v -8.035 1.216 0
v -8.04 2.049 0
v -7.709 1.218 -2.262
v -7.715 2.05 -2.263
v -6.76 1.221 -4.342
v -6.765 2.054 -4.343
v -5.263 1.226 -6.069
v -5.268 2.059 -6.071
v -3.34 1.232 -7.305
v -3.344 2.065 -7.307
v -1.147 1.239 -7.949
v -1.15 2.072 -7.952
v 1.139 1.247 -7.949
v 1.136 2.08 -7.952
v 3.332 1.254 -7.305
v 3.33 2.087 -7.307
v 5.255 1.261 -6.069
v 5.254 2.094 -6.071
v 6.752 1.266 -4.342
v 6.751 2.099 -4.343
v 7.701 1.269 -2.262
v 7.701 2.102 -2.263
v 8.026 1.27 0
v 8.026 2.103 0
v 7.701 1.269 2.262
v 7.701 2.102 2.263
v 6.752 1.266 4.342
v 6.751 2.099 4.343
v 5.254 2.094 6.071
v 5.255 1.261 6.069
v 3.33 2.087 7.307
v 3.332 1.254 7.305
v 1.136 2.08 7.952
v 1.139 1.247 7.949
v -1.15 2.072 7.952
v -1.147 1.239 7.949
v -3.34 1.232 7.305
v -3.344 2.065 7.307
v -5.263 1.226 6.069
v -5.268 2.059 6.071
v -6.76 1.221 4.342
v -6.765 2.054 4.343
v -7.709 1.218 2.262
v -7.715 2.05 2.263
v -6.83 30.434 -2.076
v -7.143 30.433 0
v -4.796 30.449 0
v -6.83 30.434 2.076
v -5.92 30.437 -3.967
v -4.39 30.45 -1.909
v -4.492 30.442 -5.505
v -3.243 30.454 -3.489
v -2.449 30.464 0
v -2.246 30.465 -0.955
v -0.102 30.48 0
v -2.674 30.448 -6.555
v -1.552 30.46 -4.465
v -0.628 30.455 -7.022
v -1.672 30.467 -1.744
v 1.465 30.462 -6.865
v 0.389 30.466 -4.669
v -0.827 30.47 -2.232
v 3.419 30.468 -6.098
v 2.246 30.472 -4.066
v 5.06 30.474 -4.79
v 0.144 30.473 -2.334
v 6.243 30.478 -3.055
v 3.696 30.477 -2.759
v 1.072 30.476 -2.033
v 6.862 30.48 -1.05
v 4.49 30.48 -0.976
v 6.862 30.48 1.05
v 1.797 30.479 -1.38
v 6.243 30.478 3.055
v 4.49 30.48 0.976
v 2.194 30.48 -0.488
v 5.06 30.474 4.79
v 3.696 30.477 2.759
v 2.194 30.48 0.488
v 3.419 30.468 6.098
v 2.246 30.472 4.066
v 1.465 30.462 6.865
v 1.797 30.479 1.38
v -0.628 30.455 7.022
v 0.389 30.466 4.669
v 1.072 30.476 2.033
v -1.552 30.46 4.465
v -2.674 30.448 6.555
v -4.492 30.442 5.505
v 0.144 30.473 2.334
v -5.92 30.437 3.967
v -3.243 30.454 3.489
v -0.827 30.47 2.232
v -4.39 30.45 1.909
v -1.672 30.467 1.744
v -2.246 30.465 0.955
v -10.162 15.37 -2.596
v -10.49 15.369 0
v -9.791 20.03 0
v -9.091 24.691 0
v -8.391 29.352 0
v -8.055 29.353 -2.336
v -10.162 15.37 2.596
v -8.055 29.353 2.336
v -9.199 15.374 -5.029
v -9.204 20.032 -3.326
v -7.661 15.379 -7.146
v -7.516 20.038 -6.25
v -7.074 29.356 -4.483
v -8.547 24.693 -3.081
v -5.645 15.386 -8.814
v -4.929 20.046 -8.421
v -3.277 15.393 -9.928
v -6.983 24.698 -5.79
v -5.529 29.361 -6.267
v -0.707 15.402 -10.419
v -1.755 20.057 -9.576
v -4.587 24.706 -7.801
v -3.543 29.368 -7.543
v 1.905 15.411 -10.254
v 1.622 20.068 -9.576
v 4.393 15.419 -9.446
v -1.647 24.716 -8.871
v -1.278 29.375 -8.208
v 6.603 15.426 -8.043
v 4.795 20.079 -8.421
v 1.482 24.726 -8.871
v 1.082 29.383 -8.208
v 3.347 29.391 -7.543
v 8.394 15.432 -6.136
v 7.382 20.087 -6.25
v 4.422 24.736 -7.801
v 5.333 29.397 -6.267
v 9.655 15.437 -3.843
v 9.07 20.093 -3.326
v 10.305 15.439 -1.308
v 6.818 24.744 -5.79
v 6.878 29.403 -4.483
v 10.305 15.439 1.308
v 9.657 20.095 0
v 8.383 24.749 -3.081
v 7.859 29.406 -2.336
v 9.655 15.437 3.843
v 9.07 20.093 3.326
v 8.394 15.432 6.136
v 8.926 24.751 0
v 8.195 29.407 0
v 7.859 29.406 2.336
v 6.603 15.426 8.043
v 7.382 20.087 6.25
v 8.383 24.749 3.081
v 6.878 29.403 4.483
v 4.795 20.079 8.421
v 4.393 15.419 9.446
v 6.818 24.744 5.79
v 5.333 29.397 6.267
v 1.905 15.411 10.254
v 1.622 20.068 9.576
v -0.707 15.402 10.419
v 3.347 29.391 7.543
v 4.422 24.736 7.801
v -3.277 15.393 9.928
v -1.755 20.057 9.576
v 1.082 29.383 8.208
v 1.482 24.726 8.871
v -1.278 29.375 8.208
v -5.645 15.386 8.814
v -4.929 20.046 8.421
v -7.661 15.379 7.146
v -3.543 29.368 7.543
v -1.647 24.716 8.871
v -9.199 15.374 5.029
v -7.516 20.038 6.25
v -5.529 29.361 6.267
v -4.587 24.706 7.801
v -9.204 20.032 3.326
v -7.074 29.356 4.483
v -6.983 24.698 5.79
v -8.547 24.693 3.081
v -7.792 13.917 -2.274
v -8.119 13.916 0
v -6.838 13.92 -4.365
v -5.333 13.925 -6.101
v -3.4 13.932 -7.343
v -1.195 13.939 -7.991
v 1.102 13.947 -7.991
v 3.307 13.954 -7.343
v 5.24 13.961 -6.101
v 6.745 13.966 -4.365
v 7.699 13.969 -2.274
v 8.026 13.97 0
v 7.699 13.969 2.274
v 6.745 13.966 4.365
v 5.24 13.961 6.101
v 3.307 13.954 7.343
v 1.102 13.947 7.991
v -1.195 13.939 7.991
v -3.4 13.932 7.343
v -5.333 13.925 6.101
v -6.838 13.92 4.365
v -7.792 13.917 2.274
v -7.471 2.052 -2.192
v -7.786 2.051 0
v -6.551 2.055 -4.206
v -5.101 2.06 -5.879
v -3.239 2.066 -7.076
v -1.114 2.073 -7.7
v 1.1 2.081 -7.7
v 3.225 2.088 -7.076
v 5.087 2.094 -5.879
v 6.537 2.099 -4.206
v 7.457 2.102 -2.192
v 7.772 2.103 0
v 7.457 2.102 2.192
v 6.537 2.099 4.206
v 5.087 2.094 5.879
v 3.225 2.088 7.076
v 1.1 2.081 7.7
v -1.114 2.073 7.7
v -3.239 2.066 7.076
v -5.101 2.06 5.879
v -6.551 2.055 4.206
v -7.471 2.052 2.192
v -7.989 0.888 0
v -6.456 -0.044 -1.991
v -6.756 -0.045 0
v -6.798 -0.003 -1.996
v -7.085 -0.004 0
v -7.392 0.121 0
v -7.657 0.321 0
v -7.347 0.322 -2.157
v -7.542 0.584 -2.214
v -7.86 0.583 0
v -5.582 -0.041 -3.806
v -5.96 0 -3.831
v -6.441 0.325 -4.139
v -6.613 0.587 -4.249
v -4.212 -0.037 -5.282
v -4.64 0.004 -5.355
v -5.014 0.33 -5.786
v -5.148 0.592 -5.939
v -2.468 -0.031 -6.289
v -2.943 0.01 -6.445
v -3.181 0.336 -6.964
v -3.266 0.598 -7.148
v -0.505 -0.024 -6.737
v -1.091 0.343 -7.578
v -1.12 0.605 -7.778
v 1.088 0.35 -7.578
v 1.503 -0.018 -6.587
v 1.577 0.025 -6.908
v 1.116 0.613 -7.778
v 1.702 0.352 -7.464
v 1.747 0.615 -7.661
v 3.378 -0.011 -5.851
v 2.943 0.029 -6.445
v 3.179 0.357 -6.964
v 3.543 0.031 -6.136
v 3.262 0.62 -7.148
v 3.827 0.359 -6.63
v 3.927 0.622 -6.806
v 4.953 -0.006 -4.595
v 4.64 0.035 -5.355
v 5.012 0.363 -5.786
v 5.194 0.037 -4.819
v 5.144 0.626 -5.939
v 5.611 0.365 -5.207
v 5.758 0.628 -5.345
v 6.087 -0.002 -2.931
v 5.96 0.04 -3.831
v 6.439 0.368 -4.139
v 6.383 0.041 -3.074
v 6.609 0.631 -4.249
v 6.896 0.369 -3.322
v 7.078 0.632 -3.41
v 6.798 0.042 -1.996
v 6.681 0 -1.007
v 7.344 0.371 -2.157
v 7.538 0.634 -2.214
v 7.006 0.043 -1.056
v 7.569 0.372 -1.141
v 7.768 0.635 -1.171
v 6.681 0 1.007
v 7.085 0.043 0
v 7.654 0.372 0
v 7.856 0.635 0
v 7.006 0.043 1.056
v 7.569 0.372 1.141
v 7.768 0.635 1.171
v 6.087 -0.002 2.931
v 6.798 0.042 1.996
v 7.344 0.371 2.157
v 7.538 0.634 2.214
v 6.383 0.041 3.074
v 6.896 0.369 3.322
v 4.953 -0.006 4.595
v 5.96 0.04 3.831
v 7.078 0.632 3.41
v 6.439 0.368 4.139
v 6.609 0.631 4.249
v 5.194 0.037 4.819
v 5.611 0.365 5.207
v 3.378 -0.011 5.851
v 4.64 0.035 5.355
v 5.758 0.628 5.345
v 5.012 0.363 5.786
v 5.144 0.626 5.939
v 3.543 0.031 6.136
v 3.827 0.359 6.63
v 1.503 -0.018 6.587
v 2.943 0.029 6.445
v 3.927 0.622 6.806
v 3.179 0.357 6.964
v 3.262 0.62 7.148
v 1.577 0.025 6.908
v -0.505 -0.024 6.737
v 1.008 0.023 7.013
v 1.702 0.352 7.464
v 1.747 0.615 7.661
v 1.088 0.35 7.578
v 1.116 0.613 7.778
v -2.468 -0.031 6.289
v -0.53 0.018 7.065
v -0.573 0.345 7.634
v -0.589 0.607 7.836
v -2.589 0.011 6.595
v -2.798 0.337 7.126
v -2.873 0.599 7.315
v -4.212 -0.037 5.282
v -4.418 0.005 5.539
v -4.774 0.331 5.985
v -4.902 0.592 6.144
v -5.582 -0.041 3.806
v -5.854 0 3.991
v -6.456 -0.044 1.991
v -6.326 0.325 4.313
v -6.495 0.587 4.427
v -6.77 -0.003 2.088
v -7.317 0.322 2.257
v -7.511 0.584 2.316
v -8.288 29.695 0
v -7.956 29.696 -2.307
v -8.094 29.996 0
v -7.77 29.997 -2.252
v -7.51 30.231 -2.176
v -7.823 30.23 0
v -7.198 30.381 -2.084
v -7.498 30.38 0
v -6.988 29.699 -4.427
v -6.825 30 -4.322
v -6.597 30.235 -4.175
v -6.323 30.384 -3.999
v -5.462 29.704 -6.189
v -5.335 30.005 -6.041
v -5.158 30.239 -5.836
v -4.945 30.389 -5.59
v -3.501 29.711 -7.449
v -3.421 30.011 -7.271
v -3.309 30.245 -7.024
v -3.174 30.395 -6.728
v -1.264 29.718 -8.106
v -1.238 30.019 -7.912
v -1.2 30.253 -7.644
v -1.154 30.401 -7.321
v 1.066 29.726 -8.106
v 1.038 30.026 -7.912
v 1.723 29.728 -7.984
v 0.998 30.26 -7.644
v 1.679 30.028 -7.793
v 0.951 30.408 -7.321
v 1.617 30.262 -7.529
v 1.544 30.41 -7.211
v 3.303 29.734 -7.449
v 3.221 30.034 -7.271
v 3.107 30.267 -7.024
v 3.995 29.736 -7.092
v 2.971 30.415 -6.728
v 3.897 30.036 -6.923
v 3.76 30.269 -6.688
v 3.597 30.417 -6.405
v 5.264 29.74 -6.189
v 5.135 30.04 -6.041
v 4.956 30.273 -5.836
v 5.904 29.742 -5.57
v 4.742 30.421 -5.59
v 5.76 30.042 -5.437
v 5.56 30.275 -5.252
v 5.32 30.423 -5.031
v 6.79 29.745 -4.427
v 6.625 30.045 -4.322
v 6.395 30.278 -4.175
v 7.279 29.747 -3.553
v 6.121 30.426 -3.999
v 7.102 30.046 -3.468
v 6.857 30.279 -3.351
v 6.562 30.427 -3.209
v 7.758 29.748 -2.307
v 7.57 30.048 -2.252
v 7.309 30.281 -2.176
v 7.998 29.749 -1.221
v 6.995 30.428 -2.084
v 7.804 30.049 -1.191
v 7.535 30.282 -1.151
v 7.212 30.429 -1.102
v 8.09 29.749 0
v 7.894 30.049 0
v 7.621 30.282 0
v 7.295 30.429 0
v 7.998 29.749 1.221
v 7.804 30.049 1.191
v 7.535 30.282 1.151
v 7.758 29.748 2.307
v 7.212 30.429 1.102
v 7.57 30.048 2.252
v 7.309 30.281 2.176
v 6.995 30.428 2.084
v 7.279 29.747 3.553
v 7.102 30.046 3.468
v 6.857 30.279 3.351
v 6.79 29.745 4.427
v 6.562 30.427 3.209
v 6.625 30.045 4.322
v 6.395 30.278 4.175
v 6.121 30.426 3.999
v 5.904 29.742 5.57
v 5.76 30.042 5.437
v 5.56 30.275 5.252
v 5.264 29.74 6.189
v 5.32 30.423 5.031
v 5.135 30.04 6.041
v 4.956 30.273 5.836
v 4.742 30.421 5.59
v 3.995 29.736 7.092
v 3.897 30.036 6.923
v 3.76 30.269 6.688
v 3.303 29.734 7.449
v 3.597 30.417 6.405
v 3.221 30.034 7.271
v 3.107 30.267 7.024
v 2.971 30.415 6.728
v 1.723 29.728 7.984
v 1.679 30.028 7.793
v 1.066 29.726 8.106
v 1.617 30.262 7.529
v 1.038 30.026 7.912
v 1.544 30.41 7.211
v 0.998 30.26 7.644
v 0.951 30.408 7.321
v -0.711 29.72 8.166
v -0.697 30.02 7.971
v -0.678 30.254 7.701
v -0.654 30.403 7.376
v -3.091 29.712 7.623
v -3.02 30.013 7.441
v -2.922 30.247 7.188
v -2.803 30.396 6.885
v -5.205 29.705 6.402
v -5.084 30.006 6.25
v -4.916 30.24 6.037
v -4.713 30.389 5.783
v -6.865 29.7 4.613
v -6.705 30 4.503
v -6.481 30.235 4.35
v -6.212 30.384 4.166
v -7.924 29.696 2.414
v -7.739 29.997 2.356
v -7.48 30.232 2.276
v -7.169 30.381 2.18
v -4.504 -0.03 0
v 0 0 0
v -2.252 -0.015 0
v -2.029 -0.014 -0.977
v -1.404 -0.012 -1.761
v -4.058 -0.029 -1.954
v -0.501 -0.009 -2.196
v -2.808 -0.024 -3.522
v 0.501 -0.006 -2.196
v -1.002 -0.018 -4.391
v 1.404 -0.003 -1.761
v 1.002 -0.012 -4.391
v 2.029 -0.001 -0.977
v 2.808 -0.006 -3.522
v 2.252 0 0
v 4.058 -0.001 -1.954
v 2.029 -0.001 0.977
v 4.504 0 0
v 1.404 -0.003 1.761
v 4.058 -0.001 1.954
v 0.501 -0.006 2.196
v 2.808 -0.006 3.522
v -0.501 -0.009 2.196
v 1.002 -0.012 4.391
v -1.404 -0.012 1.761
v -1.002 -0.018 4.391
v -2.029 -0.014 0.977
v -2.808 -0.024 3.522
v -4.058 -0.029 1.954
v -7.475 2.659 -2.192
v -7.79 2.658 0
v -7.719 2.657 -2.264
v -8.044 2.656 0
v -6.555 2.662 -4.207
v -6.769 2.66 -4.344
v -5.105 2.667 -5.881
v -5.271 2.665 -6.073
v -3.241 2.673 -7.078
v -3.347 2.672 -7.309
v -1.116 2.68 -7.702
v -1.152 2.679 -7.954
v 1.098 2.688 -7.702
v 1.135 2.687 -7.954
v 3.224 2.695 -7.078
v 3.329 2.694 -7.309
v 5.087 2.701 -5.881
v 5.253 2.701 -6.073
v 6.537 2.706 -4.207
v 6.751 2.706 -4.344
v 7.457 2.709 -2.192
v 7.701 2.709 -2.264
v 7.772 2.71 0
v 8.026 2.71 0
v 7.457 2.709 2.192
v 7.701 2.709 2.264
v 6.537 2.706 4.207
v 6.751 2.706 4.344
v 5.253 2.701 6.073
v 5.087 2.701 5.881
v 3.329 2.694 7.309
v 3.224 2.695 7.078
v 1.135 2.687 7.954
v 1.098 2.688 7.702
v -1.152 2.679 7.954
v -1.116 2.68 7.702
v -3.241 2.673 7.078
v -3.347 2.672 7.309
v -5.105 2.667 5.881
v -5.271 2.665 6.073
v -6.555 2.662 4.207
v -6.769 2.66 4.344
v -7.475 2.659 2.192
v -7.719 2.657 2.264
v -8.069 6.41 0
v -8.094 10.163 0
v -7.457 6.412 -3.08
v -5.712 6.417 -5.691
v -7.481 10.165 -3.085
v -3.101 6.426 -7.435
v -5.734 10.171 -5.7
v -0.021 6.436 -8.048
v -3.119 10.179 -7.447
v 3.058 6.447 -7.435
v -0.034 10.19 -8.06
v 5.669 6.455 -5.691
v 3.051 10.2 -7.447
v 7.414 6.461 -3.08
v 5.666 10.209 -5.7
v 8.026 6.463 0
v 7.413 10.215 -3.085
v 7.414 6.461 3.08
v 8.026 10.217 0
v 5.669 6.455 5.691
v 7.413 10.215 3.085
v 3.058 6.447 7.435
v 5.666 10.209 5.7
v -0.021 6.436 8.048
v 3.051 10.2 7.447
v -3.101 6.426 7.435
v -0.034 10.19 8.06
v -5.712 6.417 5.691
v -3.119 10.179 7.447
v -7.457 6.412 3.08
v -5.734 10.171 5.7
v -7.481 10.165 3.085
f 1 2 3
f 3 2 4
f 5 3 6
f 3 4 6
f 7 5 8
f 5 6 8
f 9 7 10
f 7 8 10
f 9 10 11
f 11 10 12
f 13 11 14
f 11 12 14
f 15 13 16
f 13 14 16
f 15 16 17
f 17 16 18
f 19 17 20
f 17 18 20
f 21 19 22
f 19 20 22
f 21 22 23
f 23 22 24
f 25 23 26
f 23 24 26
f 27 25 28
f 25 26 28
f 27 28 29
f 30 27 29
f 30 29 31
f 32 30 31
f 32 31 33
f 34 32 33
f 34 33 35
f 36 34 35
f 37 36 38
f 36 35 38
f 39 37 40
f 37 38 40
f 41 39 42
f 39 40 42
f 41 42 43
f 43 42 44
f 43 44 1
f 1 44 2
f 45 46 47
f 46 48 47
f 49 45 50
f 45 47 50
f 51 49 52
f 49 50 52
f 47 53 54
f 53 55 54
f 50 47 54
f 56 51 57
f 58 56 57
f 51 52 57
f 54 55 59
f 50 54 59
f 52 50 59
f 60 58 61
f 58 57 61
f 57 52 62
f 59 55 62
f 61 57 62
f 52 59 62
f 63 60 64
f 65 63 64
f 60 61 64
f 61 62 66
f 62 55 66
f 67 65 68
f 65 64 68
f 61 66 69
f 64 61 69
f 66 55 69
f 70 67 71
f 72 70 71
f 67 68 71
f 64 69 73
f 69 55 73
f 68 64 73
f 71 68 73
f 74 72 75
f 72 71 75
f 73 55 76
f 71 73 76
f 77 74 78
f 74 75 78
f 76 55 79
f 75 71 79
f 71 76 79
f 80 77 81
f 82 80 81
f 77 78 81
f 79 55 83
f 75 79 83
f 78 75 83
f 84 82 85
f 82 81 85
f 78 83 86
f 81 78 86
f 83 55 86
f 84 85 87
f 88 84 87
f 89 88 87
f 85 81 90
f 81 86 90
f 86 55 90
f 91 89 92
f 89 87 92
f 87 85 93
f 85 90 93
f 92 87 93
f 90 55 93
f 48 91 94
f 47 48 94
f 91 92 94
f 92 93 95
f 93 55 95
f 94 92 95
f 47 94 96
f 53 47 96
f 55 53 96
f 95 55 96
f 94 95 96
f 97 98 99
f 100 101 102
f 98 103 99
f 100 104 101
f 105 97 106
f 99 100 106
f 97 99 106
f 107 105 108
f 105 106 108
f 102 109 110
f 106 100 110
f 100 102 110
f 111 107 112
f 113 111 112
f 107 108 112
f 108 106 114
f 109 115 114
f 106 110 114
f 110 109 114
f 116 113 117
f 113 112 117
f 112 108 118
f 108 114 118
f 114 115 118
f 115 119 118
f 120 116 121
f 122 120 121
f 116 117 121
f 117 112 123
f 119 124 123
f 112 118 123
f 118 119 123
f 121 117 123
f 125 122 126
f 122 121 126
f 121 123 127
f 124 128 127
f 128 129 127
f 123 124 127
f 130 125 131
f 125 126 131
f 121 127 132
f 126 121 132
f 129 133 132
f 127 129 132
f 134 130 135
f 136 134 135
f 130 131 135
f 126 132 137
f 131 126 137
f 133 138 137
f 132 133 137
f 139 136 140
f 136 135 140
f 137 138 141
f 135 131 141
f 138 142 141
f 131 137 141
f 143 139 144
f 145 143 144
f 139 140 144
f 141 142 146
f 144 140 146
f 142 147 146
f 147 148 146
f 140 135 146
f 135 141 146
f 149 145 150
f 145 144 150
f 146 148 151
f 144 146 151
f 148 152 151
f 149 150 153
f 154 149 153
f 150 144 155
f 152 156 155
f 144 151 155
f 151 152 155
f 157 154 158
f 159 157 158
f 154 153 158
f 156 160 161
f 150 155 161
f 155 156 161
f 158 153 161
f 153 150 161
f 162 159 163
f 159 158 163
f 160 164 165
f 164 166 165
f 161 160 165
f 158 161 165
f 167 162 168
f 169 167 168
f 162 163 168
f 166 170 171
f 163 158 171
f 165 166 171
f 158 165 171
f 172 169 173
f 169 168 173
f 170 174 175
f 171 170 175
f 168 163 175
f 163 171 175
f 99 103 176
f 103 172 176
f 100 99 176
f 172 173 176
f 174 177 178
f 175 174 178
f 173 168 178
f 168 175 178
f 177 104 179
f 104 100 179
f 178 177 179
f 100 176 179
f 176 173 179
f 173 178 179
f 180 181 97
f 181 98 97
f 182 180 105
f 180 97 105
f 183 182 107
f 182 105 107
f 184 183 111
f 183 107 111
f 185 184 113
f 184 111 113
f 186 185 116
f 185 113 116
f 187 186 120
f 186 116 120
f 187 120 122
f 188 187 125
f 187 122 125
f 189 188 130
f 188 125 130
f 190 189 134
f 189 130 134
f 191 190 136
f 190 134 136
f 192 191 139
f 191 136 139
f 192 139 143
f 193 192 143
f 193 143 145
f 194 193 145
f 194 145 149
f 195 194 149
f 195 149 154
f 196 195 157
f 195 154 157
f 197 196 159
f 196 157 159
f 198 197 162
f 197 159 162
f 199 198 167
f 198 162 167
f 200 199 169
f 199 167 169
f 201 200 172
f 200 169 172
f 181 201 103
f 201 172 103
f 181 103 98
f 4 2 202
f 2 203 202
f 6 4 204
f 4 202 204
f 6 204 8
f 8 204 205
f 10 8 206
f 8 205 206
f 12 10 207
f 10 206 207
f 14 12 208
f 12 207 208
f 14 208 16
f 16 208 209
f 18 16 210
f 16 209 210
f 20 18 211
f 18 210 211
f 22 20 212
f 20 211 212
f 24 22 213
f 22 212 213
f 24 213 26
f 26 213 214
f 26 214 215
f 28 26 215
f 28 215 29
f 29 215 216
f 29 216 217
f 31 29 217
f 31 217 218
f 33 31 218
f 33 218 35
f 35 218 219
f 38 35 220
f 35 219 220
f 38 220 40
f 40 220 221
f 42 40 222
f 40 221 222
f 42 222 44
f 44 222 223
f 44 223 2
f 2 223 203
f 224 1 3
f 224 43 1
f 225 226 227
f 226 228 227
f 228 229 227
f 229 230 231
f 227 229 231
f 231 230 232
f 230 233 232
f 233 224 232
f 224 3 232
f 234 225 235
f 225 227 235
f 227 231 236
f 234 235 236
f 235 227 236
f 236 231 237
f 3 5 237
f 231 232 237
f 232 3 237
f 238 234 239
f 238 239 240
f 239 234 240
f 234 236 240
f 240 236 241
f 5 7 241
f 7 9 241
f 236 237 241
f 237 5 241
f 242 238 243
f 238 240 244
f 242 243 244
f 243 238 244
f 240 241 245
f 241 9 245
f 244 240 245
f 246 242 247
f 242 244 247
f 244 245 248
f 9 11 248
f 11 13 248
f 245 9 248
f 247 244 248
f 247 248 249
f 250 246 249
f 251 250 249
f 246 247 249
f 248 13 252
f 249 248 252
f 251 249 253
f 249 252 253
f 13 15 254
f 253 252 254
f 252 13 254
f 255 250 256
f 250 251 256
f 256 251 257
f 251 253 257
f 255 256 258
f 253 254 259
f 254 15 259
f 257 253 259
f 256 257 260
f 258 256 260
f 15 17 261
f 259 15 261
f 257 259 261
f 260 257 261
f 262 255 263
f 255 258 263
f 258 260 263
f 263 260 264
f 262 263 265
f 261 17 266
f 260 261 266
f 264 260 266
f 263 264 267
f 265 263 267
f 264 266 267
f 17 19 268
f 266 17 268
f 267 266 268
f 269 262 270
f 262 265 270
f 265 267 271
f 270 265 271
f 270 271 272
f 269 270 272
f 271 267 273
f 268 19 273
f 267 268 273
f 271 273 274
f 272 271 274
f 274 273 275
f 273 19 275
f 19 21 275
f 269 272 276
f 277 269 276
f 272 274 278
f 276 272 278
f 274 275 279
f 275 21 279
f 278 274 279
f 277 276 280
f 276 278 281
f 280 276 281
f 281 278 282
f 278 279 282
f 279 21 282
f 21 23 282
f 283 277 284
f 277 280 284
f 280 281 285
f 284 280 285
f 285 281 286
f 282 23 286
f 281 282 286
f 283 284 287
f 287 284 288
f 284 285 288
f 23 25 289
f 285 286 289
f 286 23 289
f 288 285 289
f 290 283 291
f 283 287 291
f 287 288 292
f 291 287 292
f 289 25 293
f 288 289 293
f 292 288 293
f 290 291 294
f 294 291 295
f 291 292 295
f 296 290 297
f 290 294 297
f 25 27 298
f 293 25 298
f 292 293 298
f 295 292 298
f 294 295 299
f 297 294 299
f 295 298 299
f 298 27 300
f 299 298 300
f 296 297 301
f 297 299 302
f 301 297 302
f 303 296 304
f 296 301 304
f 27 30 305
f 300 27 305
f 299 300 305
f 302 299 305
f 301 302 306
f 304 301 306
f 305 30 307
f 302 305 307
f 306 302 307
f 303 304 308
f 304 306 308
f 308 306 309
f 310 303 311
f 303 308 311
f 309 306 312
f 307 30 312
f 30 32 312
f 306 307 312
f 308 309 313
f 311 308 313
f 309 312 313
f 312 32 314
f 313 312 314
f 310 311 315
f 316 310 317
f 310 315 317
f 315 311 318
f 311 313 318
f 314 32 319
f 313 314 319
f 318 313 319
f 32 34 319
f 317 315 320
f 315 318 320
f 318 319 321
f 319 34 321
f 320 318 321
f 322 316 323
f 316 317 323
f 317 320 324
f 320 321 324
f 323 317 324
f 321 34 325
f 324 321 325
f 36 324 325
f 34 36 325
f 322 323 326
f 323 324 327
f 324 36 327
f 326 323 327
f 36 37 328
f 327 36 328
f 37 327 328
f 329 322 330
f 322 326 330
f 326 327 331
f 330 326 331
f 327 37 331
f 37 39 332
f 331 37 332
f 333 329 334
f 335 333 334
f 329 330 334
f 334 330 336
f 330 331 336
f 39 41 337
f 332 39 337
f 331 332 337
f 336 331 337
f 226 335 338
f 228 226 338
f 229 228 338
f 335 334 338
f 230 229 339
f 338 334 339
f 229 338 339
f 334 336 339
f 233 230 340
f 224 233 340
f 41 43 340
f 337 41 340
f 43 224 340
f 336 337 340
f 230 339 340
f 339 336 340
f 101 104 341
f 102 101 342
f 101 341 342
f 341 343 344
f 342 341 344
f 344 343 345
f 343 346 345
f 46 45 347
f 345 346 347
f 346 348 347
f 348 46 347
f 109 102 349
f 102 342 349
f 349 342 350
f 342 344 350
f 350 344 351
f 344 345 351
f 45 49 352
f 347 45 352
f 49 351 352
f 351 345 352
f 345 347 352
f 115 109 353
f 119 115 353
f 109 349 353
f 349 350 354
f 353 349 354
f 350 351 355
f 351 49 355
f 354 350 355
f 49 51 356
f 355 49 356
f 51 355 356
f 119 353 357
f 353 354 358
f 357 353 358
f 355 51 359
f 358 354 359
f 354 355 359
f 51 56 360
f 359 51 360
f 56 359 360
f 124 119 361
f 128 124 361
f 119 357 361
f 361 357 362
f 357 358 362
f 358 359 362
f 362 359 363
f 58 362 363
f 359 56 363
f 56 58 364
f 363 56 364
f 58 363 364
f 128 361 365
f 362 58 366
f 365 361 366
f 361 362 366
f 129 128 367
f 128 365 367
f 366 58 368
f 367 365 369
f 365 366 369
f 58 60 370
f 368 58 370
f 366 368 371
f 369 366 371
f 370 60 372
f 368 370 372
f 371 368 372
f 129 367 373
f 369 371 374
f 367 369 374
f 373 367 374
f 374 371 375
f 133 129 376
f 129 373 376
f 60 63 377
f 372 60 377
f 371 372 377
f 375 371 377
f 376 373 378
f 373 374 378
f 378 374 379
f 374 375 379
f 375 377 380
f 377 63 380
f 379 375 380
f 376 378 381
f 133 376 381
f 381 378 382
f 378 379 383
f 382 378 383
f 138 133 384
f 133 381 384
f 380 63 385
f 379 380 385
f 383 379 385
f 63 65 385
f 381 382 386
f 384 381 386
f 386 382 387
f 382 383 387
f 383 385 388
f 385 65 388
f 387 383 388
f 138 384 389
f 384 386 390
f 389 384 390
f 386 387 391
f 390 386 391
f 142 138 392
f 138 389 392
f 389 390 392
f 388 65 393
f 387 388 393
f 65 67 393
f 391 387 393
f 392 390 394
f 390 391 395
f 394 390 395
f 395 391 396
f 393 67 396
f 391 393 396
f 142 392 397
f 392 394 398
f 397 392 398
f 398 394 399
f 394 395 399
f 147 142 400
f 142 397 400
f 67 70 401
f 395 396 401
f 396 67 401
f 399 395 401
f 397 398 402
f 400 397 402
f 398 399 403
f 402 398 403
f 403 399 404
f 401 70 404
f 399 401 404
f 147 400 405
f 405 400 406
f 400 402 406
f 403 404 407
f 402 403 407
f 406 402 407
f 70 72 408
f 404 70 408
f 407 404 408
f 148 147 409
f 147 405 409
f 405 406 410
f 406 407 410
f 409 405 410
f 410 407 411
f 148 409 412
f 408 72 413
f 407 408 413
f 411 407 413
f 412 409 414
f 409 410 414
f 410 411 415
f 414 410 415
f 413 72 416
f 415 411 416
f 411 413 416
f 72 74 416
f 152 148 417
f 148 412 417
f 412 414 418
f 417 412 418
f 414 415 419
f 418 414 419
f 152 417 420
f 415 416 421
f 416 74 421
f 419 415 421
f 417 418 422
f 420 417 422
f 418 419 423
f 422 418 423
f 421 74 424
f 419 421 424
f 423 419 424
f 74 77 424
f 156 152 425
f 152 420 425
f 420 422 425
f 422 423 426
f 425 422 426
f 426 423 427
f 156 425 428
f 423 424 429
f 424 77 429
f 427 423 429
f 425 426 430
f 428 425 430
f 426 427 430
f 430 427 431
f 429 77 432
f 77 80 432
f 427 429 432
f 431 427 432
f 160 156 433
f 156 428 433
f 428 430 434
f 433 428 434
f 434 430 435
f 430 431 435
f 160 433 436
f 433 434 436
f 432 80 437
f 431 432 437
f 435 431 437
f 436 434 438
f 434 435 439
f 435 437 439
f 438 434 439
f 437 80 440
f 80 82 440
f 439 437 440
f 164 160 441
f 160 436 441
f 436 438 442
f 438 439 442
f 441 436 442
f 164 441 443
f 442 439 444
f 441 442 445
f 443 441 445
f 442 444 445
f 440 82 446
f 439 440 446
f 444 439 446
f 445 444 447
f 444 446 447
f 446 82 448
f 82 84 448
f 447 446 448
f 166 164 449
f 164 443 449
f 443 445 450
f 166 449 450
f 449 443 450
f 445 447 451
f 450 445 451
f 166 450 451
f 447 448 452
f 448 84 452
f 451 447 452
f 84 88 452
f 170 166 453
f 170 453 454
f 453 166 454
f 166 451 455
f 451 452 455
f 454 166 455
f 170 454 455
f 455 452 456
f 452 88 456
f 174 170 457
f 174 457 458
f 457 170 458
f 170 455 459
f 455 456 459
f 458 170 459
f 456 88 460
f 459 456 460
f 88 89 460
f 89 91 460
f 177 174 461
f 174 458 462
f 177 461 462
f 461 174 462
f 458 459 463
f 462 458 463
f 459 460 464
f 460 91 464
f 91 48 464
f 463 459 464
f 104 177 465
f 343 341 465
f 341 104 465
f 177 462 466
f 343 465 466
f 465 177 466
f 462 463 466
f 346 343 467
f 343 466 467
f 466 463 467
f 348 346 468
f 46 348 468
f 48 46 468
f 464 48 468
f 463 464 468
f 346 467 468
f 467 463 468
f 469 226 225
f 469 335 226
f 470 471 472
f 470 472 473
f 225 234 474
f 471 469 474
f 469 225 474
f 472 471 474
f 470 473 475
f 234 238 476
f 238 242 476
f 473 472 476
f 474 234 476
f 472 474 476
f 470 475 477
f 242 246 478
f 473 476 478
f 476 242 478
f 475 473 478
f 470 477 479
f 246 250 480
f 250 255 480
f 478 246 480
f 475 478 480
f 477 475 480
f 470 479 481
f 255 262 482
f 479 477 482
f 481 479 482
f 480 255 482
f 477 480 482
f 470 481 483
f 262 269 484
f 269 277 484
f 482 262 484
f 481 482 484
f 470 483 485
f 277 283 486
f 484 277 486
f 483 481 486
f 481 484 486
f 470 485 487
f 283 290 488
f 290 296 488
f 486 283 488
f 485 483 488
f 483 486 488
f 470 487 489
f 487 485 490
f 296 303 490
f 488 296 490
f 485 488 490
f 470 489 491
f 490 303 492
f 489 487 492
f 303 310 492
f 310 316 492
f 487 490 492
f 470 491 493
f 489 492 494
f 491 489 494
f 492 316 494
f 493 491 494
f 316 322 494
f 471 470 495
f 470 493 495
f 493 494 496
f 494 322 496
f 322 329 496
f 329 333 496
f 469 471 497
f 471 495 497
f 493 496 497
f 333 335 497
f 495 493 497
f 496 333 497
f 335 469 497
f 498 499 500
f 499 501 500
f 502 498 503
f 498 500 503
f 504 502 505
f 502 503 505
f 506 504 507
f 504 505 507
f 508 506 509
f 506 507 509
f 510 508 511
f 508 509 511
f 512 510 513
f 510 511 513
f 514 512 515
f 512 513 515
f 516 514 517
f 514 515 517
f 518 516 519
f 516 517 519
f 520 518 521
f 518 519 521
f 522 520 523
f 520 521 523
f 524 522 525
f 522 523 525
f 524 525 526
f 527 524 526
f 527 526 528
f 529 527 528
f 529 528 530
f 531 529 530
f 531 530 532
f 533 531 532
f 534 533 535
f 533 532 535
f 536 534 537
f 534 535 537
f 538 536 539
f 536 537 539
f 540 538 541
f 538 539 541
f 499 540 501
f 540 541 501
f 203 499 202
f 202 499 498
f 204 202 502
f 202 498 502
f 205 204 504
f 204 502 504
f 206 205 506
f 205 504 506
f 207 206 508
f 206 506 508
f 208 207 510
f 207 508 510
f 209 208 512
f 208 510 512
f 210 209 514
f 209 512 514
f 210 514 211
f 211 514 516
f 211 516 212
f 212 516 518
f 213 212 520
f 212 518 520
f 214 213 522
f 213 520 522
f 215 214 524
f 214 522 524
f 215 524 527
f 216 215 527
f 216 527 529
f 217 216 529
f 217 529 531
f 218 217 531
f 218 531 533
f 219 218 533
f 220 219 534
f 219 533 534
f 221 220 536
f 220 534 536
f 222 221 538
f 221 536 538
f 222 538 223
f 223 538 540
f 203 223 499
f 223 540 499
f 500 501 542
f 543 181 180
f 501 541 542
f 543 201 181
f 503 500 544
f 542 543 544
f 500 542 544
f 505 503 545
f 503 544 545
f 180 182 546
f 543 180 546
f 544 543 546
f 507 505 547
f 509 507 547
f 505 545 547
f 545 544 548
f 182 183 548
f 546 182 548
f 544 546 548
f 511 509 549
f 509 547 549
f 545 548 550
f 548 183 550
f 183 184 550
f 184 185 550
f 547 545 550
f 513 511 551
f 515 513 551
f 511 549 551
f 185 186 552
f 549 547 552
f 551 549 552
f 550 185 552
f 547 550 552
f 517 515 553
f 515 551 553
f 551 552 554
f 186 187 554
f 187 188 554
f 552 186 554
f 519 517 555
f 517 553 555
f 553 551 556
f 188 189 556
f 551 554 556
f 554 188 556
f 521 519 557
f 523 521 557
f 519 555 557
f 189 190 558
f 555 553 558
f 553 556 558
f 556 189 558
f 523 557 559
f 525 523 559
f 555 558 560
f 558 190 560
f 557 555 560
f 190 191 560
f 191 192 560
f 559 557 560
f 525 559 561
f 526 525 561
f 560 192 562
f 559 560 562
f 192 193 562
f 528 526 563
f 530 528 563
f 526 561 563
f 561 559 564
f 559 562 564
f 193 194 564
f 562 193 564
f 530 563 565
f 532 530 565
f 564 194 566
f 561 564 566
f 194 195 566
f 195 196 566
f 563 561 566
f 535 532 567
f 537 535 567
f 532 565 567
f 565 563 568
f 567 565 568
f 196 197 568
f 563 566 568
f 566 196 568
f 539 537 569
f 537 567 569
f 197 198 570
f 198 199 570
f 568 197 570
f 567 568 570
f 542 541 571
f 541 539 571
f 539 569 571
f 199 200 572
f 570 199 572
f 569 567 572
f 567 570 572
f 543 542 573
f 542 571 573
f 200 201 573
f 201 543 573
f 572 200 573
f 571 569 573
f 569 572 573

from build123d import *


with BuildPart() as part:
    # Sketch2 → Revolve1 (revolve)
    with BuildSketch(Plane.XY, mode=Mode.PRIVATE) as revolve1_sk:
        with BuildLine():
            Line((0, 0), (6.7564, 0))
            ThreePointArc((6.7564, 0), (7.654425612, 0.371974388), (8.0264, 1.27))
            Line((8.0264, 1.27), (8.0264, 2.102867264))
            Line((8.0264, 2.102867264), (7.7724, 2.102867264))
            Line((7.7724, 2.102867264), (7.7724, 2.709800424))
            Line((7.7724, 2.709800424), (8.0264, 2.709800424))
            Line((8.0264, 2.709800424), (8.0264, 13.97))
            Line((8.0264, 13.97), (10.387716219, 15.438949013))
            Line((10.387716219, 15.438949013), (8.194857048, 29.406966649))
            ThreePointArc((8.194857048, 29.406966649), (7.765679113, 30.175154818), (6.940223979, 30.48))
            Line((6.940223979, 30.48), (-0.1016, 30.48))
            Line((-0.1016, 30.48), (0, 0))
        make_face()
    revolve(revolve1_sk.sketch.rotate(Axis((-0.1016, 30.48, 0), (0.0033333148149691442, -0.9999944444907404, 0)), 180), axis=Axis((-0.1016, 30.48, 0), (0.0033333148149691442, -0.9999944444907404, 0)))


solid = part.part
